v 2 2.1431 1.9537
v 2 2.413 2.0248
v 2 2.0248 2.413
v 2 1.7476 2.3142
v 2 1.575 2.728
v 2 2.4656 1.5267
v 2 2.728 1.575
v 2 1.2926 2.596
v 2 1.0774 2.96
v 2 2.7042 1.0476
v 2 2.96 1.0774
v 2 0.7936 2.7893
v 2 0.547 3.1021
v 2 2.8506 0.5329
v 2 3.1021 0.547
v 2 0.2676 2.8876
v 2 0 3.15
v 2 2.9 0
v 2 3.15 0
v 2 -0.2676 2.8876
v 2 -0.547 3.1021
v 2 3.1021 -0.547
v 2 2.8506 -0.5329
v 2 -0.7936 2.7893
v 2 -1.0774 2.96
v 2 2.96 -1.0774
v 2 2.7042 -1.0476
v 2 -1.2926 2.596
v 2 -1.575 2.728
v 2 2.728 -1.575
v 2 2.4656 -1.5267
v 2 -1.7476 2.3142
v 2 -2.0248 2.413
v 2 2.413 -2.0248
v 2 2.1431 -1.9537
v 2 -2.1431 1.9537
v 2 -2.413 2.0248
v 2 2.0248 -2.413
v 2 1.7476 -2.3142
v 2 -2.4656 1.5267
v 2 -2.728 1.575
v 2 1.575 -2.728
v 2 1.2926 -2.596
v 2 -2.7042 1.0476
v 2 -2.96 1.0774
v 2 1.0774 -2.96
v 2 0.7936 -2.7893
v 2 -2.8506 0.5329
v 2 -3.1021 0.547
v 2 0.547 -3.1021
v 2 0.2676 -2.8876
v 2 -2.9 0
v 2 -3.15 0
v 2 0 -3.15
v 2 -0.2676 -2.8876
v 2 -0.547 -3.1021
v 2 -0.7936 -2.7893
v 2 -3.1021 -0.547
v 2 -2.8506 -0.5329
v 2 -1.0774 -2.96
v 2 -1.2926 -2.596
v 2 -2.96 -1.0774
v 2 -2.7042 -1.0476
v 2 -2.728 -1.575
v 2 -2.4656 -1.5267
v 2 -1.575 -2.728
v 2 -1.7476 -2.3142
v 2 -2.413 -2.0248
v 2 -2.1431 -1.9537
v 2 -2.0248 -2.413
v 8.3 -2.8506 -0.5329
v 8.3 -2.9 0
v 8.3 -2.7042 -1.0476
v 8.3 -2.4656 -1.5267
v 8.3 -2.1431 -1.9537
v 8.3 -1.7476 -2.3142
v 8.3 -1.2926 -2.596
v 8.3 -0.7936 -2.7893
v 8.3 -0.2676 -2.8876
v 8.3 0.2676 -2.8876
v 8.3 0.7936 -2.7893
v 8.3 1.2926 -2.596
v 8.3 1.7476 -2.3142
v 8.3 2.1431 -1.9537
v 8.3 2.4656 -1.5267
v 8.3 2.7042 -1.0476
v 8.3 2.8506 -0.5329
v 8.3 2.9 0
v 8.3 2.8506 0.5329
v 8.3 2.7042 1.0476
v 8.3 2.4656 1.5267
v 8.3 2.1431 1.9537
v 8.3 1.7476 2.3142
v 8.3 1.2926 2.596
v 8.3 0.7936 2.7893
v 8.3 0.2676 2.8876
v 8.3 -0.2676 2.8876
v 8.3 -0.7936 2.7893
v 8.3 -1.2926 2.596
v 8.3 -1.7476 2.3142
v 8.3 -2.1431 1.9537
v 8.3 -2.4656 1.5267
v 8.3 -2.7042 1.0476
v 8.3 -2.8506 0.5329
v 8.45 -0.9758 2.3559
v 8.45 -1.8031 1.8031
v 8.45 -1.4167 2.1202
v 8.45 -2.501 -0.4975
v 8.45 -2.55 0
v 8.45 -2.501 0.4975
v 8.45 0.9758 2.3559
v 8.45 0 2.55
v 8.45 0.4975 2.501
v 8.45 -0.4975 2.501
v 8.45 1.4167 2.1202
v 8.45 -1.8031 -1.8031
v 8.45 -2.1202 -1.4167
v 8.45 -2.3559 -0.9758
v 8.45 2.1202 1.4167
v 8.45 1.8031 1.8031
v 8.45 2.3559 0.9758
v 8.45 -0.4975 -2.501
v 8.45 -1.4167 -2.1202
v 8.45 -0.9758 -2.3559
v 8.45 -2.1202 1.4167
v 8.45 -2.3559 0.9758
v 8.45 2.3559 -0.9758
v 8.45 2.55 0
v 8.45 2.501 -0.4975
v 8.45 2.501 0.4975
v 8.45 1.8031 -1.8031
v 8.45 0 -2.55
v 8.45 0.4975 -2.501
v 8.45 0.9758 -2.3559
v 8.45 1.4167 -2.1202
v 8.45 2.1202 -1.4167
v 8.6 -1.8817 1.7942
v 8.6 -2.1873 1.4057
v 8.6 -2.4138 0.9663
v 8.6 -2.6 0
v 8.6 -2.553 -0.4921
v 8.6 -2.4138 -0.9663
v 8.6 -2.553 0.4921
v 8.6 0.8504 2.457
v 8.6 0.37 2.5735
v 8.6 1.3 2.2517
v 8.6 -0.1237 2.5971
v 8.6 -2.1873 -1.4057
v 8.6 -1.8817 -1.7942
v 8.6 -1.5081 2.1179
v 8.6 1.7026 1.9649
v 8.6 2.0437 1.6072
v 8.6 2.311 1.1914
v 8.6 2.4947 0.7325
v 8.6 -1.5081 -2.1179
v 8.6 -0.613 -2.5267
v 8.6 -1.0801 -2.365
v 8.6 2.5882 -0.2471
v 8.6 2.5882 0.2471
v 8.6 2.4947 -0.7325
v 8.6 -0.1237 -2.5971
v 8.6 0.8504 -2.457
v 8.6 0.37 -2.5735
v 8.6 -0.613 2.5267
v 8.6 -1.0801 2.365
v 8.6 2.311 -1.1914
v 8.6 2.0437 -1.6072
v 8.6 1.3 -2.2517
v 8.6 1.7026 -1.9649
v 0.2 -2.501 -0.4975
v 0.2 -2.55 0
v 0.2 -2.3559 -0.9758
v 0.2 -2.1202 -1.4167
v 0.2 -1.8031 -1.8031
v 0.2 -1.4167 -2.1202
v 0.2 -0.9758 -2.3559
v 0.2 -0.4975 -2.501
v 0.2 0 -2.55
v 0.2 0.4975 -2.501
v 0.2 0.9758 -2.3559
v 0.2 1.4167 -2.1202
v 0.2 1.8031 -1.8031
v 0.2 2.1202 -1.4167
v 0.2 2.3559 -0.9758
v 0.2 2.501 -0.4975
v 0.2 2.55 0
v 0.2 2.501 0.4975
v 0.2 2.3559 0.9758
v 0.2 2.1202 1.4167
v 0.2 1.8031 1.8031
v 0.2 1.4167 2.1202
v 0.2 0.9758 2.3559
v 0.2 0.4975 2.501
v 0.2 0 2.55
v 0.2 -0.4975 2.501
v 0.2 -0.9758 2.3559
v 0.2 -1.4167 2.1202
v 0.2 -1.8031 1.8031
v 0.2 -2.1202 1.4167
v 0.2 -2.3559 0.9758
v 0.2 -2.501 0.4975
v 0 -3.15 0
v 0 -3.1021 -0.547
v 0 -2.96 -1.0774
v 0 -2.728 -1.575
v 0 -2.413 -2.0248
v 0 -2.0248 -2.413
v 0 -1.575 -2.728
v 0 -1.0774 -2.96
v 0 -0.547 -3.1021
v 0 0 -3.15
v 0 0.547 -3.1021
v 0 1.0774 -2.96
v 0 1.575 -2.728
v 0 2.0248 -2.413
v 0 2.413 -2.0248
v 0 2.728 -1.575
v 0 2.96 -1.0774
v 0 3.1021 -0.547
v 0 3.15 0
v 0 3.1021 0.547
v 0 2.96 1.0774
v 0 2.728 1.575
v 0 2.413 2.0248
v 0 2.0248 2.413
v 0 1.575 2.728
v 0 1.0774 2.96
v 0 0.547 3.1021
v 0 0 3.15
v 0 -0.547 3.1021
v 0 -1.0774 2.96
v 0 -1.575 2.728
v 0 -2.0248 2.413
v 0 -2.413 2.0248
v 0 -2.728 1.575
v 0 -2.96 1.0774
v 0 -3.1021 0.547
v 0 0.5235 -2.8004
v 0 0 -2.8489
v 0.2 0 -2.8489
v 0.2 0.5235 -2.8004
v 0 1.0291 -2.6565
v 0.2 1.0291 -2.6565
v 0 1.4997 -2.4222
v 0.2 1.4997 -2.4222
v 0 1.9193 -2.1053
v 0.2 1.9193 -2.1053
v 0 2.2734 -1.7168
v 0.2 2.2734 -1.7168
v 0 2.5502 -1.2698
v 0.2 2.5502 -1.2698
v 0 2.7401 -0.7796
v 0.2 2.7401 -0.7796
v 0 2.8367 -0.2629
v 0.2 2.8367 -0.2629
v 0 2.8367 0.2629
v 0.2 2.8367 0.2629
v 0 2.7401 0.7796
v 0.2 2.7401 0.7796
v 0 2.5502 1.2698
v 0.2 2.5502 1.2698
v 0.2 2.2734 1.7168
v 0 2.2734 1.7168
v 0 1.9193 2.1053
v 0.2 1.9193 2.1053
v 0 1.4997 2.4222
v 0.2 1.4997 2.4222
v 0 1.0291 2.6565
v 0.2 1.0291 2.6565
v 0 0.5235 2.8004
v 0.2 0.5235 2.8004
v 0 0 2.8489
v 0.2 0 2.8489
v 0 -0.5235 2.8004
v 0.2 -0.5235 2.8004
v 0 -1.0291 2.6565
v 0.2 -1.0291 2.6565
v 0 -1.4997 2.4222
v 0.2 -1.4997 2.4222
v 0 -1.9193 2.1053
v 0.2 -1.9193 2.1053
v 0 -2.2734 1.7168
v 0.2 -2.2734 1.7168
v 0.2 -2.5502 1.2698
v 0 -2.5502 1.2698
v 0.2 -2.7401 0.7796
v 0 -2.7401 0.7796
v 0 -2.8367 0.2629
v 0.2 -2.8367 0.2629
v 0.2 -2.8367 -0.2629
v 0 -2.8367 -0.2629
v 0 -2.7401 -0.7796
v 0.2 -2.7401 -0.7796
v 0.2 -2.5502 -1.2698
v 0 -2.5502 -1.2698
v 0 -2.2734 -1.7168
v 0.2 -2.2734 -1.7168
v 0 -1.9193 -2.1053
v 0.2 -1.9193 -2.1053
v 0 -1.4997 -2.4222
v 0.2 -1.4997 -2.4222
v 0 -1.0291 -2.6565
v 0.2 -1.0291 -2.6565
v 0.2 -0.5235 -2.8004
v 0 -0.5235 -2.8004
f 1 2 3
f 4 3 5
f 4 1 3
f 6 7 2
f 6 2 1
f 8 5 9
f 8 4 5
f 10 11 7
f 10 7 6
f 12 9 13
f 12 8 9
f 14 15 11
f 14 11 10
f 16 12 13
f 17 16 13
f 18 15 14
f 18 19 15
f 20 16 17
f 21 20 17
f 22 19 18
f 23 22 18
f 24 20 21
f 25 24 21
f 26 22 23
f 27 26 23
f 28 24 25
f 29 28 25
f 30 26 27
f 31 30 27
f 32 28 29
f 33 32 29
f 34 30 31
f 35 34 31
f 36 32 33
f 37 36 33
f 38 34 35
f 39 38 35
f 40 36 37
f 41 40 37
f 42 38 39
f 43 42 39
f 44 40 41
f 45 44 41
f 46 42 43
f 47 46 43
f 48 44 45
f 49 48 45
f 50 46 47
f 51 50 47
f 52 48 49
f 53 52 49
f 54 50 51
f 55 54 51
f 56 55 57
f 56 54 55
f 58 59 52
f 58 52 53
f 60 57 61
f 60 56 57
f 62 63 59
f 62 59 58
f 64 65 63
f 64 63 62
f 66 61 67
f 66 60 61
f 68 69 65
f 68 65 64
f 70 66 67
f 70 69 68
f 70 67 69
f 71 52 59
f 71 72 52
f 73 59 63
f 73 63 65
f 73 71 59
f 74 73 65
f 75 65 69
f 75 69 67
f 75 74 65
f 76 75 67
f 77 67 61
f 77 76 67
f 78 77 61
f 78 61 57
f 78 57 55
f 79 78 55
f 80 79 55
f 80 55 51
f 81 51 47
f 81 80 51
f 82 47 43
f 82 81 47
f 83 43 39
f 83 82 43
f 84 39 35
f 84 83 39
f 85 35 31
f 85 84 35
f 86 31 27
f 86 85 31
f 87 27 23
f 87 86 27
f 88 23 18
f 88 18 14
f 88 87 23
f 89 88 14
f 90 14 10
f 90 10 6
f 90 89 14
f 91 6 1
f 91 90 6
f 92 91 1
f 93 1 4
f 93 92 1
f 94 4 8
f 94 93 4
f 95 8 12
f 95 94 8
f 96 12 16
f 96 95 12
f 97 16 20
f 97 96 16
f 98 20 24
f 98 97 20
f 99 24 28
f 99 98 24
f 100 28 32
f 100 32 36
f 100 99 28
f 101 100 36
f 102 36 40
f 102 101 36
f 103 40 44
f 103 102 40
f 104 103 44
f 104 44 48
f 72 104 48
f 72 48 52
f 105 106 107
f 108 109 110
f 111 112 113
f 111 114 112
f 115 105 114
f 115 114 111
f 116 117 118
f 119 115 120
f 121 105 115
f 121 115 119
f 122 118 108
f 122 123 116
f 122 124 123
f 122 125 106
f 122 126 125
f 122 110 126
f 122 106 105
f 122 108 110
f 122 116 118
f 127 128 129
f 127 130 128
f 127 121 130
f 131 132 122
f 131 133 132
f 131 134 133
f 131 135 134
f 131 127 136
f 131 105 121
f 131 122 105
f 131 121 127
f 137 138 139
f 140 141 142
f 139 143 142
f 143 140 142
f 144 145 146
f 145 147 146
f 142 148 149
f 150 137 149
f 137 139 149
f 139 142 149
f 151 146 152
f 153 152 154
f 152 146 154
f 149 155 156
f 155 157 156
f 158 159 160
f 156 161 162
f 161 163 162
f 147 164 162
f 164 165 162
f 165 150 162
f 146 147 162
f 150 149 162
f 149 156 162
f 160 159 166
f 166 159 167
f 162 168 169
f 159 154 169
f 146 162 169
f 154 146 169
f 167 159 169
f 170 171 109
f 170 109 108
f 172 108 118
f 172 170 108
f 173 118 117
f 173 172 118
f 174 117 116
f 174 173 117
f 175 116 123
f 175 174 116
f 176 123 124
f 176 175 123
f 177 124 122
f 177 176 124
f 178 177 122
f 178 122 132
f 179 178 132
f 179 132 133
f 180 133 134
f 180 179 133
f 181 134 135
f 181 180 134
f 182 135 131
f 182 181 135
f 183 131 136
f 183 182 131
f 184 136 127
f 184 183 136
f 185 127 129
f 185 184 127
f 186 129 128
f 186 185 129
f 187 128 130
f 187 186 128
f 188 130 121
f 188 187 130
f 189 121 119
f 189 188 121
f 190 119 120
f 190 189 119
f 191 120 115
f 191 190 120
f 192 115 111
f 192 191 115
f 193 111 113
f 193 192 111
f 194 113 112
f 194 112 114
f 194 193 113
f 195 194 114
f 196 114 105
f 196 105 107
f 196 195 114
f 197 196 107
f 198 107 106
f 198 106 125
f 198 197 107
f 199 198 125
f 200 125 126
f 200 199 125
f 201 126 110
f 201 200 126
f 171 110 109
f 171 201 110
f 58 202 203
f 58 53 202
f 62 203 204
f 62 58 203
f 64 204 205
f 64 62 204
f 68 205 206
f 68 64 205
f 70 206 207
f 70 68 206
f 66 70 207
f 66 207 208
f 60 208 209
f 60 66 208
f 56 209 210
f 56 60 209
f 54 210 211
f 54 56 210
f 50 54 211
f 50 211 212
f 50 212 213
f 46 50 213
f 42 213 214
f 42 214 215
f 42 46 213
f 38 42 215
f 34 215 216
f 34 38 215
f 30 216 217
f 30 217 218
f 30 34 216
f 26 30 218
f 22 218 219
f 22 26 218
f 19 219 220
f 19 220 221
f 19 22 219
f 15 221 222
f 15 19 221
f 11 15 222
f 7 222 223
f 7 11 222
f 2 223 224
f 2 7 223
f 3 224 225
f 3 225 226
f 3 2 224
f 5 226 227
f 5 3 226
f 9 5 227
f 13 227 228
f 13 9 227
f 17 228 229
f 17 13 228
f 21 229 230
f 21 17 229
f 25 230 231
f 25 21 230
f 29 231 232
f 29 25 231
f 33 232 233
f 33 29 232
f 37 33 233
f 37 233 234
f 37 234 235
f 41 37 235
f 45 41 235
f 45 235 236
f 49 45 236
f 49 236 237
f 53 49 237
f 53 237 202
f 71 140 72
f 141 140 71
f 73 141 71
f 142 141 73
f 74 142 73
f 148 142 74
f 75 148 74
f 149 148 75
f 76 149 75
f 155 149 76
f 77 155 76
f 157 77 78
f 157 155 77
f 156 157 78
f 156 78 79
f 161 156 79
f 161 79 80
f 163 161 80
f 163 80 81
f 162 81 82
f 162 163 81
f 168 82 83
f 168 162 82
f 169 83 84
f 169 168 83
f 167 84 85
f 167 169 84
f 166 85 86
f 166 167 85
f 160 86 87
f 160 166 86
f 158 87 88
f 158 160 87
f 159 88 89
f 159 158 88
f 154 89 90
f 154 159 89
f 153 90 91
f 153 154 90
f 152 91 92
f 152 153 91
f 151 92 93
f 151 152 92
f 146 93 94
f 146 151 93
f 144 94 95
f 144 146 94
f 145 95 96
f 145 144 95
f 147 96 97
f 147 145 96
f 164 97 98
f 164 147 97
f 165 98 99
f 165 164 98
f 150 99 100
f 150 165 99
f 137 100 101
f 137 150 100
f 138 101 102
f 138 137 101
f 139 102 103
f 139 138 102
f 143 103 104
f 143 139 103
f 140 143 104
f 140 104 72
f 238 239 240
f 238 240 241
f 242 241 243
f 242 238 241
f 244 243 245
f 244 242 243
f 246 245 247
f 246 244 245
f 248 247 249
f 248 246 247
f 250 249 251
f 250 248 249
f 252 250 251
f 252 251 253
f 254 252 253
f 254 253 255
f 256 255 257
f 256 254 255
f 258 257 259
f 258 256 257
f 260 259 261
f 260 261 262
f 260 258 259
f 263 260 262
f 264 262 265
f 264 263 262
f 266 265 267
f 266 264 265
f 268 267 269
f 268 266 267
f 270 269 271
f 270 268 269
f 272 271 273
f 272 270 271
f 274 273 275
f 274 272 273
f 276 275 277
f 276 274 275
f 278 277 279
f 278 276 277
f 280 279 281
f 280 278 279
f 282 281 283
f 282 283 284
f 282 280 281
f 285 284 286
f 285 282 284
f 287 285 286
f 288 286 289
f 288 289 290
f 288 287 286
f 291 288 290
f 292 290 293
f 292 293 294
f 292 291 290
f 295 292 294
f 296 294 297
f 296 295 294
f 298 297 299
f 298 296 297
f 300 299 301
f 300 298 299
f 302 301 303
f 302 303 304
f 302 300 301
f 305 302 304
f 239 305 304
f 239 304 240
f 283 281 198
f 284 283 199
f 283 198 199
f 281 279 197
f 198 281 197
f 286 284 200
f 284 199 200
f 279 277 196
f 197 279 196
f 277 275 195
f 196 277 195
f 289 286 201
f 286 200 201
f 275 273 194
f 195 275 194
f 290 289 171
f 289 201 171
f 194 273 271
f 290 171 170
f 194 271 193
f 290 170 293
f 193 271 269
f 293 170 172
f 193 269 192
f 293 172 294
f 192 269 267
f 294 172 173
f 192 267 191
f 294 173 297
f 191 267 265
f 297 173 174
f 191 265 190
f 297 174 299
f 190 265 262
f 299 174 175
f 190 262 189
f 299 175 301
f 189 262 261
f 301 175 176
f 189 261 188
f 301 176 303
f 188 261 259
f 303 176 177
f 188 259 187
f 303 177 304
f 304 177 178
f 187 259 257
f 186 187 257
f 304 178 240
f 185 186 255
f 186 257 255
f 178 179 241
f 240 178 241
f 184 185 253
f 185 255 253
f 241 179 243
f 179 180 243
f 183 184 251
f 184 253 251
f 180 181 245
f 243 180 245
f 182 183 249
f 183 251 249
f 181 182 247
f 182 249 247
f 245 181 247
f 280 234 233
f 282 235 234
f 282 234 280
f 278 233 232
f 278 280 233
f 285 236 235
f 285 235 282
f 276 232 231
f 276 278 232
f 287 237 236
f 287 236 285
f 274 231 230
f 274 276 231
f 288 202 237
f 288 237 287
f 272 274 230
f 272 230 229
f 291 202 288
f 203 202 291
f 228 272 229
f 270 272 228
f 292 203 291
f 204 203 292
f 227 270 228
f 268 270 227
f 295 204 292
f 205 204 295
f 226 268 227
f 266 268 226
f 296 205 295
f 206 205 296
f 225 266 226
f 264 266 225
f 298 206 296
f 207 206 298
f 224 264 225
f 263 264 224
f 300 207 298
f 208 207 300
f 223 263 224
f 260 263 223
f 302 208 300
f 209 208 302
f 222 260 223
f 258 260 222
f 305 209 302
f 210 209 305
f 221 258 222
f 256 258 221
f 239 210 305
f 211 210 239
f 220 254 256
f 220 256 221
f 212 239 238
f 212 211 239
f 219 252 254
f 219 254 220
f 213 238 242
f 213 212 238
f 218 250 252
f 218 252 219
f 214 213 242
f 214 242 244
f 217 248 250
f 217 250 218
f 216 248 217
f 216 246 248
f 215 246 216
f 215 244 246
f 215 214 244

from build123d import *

# Parameters (mm, degrees)
ESBO_O2_R             = 2.848867015
CORTE_EXTRUS_O1_DEPTH = 0.2


with BuildPart() as part:
    # Esboço1 → Revolução1 (revolve)
    with BuildSketch(Plane.XY, mode=Mode.PRIVATE) as revolu_o1_sk:
        Polygon((8.3, 2.9), (8.6, 2.6), (8.6, 2.55), (8.6, 0), (8.45, 0), (8.45, 2.55), (0, 2.55), (0, 3.15), (2, 3.15), (2, 2.9), align=None)
    revolve(revolu_o1_sk.sketch.rotate(Axis((0, 0, 0), (1, 0, 0)), 180), axis=Axis((0, 0, 0), (1, 0, 0)))

    # Esboço2 → Corte-extrusão1 (cut)
    with BuildSketch(Plane(origin=(0, 0, 0), x_dir=(0, 0, -1), z_dir=(1, 0, 0))):
        Circle(ESBO_O2_R)
    extrude(amount=CORTE_EXTRUS_O1_DEPTH, mode=Mode.SUBTRACT)


solid = part.part
